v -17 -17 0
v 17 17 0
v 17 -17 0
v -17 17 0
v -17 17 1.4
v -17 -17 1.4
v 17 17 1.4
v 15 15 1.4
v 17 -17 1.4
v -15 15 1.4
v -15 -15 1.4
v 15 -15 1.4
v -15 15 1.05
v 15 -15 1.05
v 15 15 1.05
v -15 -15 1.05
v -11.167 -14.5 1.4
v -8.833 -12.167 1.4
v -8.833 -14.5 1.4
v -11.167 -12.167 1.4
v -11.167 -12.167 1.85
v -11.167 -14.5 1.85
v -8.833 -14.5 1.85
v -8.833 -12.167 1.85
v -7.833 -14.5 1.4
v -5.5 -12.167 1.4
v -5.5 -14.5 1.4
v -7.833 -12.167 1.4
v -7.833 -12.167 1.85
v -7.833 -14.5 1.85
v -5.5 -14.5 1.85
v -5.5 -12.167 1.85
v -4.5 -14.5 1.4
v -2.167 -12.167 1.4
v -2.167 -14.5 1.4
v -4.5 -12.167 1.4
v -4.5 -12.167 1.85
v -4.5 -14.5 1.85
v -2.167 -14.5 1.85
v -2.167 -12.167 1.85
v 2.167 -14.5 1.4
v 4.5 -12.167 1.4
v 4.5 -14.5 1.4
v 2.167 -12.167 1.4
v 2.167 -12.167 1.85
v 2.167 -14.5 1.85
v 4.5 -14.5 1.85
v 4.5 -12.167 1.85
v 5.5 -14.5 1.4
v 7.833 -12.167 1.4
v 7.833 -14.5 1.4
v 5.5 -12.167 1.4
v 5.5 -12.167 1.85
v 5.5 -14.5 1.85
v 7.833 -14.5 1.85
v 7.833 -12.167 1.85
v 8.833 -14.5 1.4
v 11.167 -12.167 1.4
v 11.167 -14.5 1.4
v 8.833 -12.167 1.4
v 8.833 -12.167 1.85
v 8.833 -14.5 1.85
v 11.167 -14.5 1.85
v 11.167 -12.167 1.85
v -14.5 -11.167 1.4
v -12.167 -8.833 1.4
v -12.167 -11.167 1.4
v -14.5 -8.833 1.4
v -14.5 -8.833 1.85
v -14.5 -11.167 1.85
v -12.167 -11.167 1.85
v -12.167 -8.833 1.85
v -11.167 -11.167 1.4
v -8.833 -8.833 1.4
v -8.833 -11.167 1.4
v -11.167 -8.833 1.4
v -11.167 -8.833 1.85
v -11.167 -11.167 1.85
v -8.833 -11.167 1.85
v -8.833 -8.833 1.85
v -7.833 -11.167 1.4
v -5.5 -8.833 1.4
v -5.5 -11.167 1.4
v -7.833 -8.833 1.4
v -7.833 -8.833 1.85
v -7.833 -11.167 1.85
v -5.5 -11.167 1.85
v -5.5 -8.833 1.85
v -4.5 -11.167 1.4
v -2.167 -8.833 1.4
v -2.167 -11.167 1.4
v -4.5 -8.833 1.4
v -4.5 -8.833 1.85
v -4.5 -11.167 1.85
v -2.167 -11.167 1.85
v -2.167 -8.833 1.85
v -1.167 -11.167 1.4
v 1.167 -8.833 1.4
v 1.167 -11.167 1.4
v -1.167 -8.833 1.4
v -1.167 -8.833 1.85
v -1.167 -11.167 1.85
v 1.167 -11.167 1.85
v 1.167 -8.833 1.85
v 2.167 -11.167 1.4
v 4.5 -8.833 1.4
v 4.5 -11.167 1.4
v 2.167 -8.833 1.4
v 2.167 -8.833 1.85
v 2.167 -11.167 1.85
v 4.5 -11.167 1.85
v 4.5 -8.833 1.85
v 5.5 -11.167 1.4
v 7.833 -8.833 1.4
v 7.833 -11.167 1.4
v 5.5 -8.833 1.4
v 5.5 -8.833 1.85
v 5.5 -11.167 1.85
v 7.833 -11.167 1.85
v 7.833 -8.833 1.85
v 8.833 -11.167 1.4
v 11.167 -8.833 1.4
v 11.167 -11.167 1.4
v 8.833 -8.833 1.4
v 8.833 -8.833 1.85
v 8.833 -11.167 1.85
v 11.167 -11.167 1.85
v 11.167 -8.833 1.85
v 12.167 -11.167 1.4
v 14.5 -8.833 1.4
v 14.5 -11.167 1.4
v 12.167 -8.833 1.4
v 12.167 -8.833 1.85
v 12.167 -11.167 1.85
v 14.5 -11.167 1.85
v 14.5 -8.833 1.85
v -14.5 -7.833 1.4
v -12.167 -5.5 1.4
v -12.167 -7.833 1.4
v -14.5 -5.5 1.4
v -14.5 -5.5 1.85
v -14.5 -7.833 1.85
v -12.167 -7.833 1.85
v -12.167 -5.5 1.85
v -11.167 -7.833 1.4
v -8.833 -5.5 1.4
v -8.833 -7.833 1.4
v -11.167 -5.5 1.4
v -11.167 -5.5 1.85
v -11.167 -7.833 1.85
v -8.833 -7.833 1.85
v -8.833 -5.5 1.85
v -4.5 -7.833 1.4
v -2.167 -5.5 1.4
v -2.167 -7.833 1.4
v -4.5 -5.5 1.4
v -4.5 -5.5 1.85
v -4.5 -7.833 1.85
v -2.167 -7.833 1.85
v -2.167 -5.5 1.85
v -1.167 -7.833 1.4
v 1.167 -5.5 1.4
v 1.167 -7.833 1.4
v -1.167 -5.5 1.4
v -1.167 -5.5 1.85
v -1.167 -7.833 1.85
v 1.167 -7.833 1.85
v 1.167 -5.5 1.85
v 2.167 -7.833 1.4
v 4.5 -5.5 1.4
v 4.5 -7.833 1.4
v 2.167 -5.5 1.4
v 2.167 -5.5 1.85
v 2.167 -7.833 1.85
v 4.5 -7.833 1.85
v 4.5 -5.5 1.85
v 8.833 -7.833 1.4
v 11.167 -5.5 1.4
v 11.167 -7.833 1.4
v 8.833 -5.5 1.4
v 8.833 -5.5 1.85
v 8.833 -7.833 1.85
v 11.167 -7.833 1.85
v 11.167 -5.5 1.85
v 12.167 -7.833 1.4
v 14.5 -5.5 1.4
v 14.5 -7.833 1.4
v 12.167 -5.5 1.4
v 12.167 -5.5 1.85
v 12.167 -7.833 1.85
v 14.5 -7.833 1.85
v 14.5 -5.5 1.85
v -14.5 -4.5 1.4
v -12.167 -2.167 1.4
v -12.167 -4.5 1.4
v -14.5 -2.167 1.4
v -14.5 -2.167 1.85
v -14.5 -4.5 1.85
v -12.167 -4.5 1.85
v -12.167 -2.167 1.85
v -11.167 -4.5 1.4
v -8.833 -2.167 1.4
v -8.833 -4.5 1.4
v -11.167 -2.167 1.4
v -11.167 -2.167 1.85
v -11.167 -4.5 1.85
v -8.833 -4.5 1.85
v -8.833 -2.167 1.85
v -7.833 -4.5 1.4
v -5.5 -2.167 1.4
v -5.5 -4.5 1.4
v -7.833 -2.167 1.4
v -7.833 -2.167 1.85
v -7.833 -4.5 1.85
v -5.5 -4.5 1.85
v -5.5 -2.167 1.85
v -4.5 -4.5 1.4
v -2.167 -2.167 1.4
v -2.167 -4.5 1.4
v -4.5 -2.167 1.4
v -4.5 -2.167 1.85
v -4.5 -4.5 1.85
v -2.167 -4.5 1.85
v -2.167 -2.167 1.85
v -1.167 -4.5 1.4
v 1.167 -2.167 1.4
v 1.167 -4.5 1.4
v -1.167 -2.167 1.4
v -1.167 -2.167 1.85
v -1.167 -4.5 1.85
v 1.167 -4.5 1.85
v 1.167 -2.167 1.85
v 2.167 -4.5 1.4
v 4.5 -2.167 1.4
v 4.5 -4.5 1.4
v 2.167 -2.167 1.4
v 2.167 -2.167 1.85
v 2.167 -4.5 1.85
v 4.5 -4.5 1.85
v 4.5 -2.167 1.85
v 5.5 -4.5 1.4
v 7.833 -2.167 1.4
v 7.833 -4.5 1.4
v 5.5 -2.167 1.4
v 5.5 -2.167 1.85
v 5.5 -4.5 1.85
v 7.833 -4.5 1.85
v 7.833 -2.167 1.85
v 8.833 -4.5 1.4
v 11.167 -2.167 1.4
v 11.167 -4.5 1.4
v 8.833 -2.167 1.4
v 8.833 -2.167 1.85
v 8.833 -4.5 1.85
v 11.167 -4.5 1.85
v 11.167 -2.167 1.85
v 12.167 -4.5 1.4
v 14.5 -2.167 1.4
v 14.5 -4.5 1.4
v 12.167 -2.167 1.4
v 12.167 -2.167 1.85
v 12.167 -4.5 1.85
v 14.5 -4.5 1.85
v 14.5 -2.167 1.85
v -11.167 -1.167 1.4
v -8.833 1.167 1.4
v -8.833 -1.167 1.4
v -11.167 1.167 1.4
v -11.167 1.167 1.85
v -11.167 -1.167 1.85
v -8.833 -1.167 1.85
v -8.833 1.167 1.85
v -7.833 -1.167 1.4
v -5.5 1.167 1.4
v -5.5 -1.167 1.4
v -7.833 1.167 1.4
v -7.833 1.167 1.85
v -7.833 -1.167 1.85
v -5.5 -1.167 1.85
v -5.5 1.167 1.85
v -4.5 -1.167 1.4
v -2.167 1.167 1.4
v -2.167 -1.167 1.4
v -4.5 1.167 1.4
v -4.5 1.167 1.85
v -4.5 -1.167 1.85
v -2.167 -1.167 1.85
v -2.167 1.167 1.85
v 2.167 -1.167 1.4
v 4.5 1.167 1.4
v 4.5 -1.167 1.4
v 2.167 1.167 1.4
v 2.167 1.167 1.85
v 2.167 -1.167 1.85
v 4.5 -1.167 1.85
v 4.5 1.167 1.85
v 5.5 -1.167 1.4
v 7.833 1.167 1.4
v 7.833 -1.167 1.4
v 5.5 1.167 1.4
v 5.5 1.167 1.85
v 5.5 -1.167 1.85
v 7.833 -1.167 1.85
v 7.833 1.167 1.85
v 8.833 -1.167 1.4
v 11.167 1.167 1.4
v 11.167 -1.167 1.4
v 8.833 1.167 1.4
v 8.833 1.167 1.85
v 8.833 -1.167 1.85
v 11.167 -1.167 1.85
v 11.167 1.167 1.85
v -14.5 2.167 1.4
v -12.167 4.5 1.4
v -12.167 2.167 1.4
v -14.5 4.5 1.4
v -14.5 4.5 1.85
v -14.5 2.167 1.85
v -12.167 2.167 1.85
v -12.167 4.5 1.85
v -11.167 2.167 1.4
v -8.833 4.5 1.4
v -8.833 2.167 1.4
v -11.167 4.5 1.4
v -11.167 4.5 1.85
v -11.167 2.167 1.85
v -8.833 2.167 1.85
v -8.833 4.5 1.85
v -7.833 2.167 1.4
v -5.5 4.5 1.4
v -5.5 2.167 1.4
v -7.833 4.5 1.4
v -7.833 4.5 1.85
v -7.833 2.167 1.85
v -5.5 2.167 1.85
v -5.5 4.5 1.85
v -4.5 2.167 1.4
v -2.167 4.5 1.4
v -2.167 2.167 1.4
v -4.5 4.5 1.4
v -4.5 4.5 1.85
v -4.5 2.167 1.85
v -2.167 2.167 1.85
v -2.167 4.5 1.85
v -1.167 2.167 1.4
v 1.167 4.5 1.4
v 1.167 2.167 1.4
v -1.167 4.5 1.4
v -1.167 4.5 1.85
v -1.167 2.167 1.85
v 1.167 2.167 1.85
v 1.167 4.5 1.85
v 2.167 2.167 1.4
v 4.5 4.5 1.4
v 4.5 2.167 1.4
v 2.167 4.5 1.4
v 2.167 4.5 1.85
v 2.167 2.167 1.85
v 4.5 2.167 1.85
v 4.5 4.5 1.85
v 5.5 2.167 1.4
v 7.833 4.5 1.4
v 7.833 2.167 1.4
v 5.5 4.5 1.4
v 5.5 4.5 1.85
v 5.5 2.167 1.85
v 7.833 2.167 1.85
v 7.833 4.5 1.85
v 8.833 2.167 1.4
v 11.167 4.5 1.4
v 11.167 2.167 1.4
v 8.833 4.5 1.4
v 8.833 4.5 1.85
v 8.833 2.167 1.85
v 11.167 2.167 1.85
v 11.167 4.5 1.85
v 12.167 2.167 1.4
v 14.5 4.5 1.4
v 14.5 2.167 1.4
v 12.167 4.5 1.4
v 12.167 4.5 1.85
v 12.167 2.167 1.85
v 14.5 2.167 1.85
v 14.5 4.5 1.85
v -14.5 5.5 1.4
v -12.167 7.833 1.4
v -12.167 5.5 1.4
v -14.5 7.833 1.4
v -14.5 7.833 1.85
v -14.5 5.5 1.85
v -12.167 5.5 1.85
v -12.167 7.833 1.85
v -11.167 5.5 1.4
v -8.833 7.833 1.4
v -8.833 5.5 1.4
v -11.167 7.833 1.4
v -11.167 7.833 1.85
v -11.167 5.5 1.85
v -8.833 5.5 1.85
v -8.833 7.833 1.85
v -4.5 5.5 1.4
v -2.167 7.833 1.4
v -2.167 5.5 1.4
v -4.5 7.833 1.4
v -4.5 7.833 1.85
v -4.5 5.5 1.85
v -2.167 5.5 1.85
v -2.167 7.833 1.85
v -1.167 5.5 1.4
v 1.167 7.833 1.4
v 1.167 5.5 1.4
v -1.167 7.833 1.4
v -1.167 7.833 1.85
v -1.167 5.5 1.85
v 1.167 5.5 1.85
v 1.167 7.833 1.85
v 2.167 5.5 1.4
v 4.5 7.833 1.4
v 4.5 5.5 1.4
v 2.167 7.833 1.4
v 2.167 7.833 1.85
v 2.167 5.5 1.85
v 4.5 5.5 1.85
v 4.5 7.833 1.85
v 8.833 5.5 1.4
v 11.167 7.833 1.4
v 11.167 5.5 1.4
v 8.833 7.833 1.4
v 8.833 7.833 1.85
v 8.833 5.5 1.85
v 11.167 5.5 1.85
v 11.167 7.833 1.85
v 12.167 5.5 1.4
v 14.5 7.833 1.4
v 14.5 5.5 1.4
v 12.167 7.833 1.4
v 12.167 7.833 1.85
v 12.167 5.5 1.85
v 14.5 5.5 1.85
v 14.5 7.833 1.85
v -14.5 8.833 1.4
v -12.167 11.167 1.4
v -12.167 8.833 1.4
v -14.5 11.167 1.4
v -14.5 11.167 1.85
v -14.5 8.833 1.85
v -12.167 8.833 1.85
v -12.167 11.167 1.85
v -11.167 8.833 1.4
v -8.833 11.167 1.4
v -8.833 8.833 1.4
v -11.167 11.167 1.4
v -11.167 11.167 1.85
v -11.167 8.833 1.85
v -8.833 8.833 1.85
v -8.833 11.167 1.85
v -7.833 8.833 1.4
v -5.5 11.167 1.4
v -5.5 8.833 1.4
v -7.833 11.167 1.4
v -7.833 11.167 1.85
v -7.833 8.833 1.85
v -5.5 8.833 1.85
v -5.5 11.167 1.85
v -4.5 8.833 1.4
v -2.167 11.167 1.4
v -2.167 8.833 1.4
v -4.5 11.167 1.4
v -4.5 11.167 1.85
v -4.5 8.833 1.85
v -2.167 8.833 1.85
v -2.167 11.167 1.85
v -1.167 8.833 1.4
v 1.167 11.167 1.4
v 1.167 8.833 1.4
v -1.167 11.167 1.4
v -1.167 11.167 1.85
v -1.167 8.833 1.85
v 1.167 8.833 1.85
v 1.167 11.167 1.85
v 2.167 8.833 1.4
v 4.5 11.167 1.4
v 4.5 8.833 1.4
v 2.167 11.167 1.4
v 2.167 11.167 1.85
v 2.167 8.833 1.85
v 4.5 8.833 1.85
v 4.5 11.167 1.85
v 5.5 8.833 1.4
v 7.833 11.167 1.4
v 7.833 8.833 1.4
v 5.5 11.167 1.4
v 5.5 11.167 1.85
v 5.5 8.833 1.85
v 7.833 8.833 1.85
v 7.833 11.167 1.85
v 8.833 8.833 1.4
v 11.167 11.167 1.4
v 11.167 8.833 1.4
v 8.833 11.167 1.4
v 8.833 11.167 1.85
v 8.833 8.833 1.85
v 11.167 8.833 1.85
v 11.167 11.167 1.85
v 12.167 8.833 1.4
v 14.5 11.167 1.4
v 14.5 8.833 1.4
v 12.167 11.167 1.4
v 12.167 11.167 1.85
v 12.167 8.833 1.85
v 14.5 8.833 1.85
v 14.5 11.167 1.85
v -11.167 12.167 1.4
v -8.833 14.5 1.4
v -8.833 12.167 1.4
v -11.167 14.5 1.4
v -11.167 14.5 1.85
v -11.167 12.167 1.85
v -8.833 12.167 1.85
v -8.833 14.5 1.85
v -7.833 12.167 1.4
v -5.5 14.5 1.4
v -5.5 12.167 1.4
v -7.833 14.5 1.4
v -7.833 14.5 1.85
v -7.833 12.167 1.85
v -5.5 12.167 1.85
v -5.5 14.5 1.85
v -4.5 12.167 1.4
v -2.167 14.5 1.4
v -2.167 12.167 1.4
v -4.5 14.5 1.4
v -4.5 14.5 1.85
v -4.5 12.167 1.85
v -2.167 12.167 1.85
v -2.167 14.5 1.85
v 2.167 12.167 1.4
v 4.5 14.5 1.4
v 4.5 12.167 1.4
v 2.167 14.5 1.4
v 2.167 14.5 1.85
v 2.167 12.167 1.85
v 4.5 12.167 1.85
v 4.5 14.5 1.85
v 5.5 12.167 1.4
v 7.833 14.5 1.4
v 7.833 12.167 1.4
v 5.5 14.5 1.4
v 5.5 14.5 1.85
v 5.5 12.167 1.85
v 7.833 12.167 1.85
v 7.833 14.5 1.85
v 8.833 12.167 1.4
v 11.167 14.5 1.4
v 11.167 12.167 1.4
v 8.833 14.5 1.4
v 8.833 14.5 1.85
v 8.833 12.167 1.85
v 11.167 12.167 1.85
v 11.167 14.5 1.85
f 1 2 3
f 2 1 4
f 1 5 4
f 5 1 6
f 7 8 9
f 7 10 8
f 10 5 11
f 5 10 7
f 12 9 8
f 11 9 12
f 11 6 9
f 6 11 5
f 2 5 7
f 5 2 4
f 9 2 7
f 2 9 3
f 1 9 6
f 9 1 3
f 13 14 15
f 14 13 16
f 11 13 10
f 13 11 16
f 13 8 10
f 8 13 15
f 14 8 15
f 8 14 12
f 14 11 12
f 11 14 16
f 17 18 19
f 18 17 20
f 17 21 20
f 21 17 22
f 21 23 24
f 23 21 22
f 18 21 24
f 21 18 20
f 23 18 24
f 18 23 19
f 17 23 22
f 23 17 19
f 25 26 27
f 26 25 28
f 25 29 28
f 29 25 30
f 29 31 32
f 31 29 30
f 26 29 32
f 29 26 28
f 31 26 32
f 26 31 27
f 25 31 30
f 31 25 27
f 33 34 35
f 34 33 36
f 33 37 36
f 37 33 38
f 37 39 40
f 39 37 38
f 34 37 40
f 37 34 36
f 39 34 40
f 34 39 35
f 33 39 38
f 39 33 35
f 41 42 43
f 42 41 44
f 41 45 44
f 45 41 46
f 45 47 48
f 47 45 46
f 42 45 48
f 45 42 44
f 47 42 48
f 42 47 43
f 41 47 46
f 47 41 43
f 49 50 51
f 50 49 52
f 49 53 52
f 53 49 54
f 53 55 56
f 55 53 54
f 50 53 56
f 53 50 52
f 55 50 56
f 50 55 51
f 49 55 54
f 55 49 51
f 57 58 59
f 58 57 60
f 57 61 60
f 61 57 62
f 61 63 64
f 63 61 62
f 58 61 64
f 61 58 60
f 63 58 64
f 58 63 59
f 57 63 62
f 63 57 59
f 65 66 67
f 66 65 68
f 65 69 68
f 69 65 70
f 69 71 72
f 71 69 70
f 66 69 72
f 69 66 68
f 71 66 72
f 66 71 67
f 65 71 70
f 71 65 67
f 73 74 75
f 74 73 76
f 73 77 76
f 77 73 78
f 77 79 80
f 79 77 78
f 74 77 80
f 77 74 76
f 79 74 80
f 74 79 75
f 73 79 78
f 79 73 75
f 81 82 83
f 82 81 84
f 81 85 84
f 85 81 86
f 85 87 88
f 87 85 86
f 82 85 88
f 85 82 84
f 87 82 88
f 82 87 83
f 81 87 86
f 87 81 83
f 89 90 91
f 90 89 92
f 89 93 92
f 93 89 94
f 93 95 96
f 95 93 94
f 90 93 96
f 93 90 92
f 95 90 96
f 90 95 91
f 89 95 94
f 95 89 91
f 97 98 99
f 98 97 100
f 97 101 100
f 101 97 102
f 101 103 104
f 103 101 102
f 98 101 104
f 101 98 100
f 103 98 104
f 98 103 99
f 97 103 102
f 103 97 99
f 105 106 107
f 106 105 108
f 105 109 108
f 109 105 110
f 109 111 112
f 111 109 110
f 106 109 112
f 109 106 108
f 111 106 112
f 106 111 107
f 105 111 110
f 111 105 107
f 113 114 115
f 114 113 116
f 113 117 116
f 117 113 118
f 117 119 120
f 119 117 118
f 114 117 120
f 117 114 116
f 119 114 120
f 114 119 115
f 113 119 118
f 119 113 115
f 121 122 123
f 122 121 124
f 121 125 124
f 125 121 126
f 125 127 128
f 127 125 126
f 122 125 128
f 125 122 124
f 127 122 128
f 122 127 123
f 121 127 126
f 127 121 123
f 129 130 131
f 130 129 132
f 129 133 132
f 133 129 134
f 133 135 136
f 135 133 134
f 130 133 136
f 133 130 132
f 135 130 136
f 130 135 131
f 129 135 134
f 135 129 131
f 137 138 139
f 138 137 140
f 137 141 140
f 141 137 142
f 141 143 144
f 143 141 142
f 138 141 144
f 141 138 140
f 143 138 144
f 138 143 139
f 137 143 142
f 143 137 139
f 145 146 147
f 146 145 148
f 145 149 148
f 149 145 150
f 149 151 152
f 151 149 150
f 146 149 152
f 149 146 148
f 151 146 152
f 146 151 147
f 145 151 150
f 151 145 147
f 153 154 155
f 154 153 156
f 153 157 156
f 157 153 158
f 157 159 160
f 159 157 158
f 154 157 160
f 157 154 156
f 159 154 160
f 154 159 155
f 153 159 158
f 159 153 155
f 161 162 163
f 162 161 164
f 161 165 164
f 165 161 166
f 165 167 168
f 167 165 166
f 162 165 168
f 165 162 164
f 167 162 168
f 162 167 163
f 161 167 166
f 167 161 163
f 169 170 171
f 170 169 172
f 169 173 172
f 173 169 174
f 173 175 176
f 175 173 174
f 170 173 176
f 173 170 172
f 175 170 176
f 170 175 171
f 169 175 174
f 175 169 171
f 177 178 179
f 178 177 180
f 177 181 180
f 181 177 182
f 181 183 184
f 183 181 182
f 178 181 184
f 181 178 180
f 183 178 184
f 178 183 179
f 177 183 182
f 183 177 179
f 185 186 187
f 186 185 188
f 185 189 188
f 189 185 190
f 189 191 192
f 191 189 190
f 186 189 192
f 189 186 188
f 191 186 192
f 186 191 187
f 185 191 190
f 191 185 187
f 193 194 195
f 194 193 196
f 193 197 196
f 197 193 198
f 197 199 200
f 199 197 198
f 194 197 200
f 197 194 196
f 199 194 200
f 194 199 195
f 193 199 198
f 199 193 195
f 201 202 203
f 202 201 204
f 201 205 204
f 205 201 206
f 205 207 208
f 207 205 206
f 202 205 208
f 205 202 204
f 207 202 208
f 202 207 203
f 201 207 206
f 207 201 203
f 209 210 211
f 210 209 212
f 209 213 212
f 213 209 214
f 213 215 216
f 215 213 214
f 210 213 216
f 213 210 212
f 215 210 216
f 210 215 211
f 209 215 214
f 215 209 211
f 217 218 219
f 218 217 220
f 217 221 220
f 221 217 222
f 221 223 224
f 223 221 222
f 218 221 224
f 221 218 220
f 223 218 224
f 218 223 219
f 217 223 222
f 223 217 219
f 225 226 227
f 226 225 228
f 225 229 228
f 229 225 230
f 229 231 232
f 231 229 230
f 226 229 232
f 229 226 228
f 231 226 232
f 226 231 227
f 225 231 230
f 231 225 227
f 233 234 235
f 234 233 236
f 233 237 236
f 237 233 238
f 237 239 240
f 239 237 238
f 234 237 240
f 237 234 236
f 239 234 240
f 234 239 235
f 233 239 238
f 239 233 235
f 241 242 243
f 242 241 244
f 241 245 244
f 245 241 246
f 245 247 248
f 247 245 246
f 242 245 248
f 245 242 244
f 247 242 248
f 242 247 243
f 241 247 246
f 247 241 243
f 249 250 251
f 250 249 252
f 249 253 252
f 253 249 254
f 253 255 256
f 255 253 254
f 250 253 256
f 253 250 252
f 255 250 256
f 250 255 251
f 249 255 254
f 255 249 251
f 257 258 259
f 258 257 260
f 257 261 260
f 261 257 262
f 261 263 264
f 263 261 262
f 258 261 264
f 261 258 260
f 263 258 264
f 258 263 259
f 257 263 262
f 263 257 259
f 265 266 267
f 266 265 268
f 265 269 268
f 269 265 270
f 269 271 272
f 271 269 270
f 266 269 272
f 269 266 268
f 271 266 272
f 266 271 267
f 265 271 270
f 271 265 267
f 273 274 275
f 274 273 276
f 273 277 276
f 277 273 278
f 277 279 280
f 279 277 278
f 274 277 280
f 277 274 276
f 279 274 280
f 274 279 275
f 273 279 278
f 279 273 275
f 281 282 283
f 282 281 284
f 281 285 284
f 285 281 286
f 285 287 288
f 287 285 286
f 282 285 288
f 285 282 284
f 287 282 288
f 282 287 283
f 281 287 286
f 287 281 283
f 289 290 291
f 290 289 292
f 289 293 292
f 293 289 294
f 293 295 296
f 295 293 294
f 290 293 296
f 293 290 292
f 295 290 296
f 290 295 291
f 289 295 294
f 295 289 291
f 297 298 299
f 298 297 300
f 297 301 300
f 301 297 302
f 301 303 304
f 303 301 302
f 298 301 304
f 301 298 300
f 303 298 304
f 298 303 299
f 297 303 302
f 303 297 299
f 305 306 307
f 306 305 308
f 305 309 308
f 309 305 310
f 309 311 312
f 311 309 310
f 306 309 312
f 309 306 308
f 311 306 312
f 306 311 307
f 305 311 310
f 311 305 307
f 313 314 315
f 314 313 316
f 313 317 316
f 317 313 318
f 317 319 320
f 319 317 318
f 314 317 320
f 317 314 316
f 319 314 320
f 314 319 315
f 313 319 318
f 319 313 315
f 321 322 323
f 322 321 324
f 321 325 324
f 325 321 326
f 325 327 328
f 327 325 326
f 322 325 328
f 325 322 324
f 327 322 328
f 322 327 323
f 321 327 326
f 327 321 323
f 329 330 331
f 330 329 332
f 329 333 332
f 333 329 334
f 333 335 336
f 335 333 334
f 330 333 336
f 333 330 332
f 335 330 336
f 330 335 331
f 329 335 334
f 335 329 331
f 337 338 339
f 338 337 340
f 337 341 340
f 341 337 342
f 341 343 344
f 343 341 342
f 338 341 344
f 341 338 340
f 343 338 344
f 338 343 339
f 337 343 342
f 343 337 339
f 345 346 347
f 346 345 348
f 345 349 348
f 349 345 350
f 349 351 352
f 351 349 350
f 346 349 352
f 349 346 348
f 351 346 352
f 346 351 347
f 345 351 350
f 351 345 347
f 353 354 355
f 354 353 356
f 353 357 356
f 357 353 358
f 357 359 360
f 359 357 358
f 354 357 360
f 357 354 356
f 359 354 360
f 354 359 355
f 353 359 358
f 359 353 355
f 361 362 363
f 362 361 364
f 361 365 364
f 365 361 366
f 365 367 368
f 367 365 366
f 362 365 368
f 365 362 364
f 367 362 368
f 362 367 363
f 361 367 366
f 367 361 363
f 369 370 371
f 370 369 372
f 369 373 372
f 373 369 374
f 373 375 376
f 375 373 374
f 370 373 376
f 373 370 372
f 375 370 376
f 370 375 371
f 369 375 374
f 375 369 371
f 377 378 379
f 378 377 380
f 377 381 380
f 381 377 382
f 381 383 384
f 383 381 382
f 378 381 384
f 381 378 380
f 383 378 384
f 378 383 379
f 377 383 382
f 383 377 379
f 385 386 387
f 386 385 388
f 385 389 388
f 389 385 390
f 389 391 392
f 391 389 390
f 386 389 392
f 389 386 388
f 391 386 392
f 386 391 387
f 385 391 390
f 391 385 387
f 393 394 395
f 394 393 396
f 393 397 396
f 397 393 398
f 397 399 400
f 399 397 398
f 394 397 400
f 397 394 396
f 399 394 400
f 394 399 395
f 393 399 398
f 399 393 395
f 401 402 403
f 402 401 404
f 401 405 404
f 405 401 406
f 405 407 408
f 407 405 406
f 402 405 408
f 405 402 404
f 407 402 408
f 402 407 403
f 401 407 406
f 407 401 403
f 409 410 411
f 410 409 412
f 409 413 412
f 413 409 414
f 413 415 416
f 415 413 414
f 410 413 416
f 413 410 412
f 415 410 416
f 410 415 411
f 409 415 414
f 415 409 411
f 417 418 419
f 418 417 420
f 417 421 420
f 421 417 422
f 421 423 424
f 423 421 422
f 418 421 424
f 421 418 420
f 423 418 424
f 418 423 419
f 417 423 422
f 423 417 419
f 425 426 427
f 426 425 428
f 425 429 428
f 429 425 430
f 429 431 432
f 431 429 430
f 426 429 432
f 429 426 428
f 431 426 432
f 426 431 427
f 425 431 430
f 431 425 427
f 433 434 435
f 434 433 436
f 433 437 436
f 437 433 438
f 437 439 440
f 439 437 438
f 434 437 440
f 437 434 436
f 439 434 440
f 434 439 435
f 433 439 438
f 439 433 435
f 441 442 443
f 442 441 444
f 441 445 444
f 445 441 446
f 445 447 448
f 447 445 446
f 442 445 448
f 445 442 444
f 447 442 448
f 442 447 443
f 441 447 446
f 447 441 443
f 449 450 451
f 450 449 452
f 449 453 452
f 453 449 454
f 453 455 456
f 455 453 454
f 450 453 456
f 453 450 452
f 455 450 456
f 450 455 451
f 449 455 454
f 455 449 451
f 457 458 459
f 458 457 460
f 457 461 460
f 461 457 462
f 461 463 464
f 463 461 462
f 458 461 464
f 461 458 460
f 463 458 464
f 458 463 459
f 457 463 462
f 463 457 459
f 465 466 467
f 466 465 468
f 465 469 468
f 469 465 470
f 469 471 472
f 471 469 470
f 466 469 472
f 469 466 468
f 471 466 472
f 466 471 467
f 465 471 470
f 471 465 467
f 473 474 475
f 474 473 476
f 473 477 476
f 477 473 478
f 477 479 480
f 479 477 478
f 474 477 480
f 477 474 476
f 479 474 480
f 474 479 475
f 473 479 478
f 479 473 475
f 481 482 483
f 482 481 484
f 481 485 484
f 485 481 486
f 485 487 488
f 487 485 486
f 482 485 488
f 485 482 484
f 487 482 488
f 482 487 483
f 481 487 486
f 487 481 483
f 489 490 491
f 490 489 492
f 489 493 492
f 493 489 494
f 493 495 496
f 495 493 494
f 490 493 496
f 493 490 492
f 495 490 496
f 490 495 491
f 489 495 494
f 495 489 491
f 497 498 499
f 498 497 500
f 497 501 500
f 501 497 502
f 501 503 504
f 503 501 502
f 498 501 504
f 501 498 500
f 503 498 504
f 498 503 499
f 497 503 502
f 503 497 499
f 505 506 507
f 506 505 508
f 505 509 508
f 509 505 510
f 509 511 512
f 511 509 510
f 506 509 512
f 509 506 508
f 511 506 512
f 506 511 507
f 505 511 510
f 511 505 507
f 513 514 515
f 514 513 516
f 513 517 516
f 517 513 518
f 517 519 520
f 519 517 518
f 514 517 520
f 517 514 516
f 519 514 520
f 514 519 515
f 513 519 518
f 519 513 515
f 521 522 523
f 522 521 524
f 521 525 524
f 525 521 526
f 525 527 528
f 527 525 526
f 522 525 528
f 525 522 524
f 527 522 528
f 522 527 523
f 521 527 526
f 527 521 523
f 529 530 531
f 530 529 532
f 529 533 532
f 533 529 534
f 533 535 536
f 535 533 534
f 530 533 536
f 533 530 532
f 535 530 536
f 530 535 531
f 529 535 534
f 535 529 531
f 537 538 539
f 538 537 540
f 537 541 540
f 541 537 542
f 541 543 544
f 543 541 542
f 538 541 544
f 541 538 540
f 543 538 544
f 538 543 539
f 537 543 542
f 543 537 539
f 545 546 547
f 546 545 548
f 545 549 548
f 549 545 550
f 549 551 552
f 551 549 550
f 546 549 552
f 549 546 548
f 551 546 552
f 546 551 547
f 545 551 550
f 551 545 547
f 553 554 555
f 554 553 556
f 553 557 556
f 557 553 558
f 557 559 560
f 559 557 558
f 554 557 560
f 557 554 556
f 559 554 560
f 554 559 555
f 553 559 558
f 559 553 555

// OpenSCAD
// Standalone QR placeholder plate.
// Replace with a real QR sticker or imported real QR geometry after publishing.

$fn = 24;

plate_size = 34;
plate_t = 1.4;
qr_size = 30;

module qr_plate() {
  difference() {
    linear_extrude(plate_t)
      square([plate_size, plate_size], center = true);
    translate([0, 0, plate_t - 0.35])
      linear_extrude(0.5)
        square([qr_size, qr_size], center = true);
  }
}

module placeholder_blocks() {
  cell = qr_size / 9;
  for (row = [0:8]) {
    for (col = [0:8]) {
      if ((row * 3 + col * 5 + row * col) % 4 != 0) {
        translate([
          -qr_size / 2 + col * cell + cell / 2,
          -qr_size / 2 + row * cell + cell / 2,
          plate_t
        ])
          linear_extrude(0.45)
            square([cell * 0.7, cell * 0.7], center = true);
      }
    }
  }
}

qr_plate();
placeholder_blocks();
